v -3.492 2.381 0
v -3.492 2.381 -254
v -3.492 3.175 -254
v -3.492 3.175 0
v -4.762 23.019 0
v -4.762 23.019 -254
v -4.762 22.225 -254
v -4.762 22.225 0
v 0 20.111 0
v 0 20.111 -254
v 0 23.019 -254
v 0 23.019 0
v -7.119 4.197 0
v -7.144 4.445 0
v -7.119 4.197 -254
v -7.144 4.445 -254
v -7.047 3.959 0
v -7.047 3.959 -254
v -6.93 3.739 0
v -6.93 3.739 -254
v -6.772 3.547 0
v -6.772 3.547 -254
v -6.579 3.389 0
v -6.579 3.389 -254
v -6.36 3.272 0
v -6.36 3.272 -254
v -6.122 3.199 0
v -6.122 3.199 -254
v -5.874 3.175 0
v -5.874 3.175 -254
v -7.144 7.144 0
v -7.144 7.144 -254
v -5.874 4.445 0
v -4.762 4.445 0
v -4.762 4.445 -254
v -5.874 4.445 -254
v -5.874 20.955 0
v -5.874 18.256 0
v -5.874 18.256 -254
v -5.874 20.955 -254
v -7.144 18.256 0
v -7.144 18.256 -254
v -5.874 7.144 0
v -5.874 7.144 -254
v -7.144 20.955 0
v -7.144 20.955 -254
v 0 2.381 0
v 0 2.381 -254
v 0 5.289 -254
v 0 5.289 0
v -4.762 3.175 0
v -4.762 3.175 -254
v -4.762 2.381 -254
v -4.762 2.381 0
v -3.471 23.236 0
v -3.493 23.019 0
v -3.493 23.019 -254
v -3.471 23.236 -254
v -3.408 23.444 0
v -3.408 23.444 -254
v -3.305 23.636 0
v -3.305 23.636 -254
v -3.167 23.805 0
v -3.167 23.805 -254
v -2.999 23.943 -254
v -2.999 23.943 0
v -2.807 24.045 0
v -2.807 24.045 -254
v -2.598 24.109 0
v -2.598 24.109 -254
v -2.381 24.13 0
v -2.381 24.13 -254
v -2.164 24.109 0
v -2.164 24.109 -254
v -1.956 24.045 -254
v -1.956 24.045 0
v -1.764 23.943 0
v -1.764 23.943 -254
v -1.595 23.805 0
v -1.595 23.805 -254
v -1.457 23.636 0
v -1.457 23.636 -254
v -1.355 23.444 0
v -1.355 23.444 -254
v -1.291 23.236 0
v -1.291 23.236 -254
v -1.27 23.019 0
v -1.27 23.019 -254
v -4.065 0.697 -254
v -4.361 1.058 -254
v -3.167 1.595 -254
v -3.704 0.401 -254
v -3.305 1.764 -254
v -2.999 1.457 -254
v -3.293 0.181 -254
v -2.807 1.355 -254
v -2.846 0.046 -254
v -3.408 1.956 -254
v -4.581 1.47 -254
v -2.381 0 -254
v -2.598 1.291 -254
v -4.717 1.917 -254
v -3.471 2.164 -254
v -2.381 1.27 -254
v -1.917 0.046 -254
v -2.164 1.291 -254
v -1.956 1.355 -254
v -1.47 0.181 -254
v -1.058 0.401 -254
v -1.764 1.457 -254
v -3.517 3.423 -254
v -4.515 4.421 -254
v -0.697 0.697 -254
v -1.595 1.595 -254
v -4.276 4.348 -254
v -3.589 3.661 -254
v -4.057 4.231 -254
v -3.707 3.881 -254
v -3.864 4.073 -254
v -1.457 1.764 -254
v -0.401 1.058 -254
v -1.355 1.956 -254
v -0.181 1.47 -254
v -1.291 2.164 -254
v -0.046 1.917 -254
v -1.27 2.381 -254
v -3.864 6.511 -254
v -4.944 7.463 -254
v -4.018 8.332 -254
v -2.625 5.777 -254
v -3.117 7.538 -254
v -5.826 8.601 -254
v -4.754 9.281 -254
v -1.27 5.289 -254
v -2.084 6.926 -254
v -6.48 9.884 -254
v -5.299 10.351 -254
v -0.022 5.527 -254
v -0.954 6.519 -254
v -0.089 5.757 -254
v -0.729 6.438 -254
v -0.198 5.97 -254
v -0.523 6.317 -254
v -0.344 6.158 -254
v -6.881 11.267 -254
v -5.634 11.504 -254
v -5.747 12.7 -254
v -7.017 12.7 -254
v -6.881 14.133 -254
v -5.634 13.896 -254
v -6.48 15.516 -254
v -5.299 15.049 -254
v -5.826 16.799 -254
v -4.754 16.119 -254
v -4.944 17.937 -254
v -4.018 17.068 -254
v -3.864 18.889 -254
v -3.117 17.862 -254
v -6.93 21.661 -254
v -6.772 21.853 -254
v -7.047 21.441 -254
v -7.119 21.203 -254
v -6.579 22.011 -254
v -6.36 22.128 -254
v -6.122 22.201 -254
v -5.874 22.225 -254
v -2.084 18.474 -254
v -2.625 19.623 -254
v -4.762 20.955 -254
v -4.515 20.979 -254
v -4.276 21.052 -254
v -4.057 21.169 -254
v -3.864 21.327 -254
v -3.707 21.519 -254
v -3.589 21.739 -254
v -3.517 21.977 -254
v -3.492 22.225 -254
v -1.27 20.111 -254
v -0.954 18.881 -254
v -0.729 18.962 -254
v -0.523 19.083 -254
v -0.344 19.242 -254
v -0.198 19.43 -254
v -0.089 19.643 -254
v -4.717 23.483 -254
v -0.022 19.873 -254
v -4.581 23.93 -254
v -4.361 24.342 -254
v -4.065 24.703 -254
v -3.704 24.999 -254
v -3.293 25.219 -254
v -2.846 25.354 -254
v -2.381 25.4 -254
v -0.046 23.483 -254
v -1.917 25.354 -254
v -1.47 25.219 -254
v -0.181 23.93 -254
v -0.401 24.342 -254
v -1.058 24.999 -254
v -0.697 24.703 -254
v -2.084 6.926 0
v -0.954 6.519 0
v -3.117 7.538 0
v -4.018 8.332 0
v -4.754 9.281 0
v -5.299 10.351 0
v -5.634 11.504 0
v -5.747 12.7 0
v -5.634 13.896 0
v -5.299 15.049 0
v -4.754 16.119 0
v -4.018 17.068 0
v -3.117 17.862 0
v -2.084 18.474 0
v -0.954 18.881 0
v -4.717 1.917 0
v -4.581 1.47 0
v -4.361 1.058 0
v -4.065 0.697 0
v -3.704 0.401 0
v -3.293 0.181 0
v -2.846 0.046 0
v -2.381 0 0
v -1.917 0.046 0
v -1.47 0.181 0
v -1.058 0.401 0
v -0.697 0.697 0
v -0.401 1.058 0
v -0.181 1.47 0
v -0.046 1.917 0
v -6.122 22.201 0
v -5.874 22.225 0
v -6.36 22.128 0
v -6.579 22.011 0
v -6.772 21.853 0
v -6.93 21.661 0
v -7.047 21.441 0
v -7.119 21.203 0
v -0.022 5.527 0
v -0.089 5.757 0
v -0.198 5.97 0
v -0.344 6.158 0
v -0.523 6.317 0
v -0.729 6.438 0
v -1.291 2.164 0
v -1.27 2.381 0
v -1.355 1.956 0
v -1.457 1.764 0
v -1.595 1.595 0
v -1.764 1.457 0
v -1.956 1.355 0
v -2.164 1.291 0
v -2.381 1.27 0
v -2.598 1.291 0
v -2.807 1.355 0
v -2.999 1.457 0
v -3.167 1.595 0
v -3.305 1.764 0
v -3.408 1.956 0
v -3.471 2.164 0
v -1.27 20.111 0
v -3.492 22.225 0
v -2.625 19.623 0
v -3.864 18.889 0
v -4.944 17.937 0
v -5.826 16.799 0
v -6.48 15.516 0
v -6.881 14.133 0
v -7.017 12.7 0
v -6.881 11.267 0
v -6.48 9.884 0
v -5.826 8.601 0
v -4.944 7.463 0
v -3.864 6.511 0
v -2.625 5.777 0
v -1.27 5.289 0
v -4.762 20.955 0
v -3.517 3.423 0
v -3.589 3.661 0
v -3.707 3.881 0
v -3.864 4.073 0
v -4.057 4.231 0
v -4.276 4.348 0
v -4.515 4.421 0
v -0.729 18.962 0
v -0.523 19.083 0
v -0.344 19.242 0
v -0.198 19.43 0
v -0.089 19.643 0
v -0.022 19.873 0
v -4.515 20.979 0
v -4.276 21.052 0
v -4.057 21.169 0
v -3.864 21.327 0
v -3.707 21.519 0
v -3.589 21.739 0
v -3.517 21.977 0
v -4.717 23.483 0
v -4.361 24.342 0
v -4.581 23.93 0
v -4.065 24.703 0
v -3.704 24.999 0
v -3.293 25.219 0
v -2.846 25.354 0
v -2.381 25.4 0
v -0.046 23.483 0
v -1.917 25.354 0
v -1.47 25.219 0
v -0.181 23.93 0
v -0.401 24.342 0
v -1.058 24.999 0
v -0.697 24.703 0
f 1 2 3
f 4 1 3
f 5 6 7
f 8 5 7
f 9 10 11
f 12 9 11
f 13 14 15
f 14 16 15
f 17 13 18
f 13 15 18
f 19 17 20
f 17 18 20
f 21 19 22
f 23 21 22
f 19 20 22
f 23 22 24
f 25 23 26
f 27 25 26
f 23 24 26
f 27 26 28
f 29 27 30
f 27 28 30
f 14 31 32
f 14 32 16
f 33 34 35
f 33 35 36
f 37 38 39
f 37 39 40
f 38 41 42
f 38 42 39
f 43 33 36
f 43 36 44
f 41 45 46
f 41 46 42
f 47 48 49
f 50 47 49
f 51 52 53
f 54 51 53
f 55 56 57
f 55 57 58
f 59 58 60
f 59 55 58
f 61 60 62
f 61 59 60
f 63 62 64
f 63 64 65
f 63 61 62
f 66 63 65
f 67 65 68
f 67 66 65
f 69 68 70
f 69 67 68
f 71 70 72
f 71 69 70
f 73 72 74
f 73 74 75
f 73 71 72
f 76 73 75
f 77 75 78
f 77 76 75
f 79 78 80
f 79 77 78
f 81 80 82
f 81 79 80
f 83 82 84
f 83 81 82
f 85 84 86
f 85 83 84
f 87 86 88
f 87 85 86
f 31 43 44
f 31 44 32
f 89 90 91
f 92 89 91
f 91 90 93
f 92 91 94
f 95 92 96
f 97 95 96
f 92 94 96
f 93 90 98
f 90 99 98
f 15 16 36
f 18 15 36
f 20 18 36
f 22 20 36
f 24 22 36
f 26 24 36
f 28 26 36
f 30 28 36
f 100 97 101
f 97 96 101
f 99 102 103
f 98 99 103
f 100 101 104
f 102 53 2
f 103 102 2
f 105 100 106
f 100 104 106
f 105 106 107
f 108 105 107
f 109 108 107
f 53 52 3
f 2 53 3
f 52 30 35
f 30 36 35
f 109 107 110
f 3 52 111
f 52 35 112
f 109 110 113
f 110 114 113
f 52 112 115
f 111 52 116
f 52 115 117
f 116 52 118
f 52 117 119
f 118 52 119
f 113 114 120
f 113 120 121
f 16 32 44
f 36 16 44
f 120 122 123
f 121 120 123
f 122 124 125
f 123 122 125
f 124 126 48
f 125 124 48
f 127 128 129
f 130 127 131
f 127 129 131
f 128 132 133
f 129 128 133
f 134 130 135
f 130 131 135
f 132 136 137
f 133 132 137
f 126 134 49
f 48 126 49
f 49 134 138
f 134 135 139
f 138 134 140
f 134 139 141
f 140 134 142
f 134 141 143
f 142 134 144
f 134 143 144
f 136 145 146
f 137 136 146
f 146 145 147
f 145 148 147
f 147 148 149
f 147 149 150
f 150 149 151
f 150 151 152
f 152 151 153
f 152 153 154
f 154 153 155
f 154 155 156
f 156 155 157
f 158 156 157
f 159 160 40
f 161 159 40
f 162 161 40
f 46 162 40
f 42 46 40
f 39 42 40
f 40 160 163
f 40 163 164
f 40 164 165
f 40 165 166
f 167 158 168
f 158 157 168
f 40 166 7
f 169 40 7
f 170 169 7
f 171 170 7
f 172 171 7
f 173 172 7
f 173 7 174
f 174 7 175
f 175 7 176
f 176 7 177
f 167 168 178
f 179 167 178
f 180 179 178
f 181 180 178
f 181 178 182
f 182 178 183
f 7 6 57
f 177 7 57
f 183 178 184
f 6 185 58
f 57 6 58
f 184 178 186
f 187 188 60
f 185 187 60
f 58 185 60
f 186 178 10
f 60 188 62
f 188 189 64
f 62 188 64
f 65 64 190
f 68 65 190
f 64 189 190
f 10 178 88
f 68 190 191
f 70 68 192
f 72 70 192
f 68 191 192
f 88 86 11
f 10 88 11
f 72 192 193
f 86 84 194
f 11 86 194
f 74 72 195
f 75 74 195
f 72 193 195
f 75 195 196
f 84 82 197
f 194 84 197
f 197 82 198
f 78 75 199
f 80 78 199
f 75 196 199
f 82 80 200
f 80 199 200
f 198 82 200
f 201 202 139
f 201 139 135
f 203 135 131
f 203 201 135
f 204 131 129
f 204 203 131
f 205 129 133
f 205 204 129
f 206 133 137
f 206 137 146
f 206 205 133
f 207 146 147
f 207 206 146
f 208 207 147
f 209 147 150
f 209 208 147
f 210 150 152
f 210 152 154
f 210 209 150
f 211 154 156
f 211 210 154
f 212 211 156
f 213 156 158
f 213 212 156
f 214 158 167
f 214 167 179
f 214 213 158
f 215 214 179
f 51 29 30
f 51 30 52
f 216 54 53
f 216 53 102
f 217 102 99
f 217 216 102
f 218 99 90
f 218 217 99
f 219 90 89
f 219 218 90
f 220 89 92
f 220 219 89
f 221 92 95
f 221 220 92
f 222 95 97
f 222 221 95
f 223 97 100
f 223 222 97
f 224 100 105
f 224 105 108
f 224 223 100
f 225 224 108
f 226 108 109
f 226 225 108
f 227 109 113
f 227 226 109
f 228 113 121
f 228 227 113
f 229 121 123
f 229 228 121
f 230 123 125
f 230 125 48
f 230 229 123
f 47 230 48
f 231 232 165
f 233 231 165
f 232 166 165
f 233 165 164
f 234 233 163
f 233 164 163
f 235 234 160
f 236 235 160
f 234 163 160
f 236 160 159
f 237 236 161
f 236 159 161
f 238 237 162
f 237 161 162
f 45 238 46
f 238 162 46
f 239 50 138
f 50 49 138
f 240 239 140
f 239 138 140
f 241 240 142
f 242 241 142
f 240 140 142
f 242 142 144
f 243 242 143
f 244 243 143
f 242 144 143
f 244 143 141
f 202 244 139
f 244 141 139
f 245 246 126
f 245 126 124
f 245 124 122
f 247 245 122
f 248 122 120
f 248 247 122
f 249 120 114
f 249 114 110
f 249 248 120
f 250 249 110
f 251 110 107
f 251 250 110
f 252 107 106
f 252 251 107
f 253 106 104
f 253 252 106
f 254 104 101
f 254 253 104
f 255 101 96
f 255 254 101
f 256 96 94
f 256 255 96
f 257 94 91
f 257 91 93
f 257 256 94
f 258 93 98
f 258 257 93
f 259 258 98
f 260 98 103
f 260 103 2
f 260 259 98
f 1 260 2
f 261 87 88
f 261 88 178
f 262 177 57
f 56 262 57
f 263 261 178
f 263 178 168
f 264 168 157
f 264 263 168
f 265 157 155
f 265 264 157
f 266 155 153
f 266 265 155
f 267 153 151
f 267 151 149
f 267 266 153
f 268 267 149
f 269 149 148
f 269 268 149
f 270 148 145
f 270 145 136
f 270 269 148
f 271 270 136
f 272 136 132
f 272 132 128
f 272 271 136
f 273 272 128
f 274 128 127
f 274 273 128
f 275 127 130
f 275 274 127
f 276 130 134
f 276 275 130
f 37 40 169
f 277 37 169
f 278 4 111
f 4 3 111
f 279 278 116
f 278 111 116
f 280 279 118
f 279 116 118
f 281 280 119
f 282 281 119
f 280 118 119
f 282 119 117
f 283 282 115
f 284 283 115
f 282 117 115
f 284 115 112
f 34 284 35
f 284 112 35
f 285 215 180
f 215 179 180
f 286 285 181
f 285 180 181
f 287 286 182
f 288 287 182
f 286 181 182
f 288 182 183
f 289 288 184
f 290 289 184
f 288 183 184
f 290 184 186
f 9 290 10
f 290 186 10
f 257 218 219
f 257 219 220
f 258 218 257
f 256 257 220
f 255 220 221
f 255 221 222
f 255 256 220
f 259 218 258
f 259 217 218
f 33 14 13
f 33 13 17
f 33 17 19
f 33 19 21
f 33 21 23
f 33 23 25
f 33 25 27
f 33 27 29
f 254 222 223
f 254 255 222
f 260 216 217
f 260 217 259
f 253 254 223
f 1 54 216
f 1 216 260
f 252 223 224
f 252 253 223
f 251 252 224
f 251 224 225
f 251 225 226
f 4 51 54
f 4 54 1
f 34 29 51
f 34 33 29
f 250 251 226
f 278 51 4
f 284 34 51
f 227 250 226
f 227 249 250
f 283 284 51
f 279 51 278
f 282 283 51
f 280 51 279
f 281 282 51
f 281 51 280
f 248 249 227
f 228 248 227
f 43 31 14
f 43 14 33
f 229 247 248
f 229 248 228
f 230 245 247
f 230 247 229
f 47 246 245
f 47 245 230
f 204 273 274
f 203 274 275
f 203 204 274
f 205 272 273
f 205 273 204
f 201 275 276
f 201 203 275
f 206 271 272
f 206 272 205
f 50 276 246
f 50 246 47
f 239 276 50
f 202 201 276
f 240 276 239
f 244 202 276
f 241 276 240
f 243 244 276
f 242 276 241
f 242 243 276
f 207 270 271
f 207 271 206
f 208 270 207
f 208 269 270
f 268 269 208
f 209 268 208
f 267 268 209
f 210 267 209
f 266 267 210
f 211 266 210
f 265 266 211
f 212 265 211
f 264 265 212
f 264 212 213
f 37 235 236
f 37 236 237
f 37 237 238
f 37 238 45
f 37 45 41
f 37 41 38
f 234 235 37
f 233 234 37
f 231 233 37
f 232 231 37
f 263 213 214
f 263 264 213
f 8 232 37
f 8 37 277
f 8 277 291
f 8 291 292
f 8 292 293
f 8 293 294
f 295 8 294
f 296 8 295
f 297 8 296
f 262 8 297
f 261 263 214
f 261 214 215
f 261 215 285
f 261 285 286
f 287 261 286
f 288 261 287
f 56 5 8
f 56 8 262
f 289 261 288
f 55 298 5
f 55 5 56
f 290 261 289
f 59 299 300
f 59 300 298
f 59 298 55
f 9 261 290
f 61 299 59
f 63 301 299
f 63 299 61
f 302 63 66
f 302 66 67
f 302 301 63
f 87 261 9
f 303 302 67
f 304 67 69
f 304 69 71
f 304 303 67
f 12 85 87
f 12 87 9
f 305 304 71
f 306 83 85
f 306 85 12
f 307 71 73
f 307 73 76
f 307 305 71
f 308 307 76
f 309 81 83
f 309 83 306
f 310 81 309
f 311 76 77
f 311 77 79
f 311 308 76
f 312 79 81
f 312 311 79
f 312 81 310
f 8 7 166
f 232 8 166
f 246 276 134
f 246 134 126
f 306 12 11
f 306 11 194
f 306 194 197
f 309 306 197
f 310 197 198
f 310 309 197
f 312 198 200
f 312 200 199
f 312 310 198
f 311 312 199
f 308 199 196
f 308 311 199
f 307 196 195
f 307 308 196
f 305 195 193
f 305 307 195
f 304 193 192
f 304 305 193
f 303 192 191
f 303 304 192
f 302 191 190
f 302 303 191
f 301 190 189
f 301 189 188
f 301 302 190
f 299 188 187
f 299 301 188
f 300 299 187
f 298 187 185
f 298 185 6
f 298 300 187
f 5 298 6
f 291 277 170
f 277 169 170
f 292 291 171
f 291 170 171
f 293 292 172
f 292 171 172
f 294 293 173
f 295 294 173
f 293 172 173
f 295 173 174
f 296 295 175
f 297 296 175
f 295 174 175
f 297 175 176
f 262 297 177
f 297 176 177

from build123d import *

# Parameters (mm, degrees)
EXTRUDE_THIN1_DEPTH = 254
FILLET1_R           = 1.27


with BuildPart() as part:
    # Sketch1 → Extrude-Thin1 (new body)
    with BuildSketch(Plane.XY):
        with BuildLine():
            Line((-7.14375, 7.14375), (-7.14375, 3.175))
            Line((-7.14375, 3.175), (-4.7625, 3.175))
            Line((-4.7625, 3.175), (-4.7625, 2.38125))
            ThreePointArc((-4.7625, 2.38125), (-2.38125, 0), (0, 2.38125))
            Line((0, 2.38125), (0, 6.35))
            ThreePointArc((0, 6.35), (-5.74675, 12.7), (0, 19.05))
            Line((0, 19.05), (0, 23.01875))
            ThreePointArc((0, 23.01875), (-2.38125, 25.4), (-4.7625, 23.01875))
            Line((-4.7625, 23.01875), (-4.7625, 22.225))
            Line((-4.7625, 22.225), (-7.14375, 22.225))
            Line((-7.14375, 22.225), (-7.14375, 18.25625))
            Line((-7.14375, 18.25625), (-5.87375, 18.25625))
            Line((-5.87375, 18.25625), (-5.87375, 20.955))
            Line((-5.87375, 20.955), (-3.4925, 20.955))
            Line((-3.4925, 20.955), (-3.4925, 23.01875))
            ThreePointArc((-3.4925, 23.01875), (-2.38125, 24.13), (-1.27, 23.01875))
            Line((-1.27, 23.01875), (-1.27, 20.110751986))
            ThreePointArc((-1.27, 20.110751986), (-7.01675, 12.7), (-1.27, 5.289248014))
            Line((-1.27, 5.289248014), (-1.27, 2.38125))
            ThreePointArc((-1.27, 2.38125), (-2.38125, 1.27), (-3.4925, 2.38125))
            Line((-3.4925, 2.38125), (-3.4925, 4.445))
            Line((-3.4925, 4.445), (-5.87375, 4.445))
            Line((-5.87375, 4.445), (-5.87375, 7.14375))
            Line((-5.87375, 7.14375), (-7.14375, 7.14375))
        make_face()
    extrude(amount=-EXTRUDE_THIN1_DEPTH)

    # Fillet1
    fillet1_edges = [part.edges().sort_by_distance(p)[0] for p in [
        (-3.4925, 4.445, -127),
        (-3.4925, 20.955, -127),
        (-7.14375, 22.225, -127),
        (0, 19.05, -127),
        (0, 6.35, -127),
        (-7.14375, 3.175, -127),
    ]]
    fillet(fillet1_edges, radius=FILLET1_R)


solid = part.part
